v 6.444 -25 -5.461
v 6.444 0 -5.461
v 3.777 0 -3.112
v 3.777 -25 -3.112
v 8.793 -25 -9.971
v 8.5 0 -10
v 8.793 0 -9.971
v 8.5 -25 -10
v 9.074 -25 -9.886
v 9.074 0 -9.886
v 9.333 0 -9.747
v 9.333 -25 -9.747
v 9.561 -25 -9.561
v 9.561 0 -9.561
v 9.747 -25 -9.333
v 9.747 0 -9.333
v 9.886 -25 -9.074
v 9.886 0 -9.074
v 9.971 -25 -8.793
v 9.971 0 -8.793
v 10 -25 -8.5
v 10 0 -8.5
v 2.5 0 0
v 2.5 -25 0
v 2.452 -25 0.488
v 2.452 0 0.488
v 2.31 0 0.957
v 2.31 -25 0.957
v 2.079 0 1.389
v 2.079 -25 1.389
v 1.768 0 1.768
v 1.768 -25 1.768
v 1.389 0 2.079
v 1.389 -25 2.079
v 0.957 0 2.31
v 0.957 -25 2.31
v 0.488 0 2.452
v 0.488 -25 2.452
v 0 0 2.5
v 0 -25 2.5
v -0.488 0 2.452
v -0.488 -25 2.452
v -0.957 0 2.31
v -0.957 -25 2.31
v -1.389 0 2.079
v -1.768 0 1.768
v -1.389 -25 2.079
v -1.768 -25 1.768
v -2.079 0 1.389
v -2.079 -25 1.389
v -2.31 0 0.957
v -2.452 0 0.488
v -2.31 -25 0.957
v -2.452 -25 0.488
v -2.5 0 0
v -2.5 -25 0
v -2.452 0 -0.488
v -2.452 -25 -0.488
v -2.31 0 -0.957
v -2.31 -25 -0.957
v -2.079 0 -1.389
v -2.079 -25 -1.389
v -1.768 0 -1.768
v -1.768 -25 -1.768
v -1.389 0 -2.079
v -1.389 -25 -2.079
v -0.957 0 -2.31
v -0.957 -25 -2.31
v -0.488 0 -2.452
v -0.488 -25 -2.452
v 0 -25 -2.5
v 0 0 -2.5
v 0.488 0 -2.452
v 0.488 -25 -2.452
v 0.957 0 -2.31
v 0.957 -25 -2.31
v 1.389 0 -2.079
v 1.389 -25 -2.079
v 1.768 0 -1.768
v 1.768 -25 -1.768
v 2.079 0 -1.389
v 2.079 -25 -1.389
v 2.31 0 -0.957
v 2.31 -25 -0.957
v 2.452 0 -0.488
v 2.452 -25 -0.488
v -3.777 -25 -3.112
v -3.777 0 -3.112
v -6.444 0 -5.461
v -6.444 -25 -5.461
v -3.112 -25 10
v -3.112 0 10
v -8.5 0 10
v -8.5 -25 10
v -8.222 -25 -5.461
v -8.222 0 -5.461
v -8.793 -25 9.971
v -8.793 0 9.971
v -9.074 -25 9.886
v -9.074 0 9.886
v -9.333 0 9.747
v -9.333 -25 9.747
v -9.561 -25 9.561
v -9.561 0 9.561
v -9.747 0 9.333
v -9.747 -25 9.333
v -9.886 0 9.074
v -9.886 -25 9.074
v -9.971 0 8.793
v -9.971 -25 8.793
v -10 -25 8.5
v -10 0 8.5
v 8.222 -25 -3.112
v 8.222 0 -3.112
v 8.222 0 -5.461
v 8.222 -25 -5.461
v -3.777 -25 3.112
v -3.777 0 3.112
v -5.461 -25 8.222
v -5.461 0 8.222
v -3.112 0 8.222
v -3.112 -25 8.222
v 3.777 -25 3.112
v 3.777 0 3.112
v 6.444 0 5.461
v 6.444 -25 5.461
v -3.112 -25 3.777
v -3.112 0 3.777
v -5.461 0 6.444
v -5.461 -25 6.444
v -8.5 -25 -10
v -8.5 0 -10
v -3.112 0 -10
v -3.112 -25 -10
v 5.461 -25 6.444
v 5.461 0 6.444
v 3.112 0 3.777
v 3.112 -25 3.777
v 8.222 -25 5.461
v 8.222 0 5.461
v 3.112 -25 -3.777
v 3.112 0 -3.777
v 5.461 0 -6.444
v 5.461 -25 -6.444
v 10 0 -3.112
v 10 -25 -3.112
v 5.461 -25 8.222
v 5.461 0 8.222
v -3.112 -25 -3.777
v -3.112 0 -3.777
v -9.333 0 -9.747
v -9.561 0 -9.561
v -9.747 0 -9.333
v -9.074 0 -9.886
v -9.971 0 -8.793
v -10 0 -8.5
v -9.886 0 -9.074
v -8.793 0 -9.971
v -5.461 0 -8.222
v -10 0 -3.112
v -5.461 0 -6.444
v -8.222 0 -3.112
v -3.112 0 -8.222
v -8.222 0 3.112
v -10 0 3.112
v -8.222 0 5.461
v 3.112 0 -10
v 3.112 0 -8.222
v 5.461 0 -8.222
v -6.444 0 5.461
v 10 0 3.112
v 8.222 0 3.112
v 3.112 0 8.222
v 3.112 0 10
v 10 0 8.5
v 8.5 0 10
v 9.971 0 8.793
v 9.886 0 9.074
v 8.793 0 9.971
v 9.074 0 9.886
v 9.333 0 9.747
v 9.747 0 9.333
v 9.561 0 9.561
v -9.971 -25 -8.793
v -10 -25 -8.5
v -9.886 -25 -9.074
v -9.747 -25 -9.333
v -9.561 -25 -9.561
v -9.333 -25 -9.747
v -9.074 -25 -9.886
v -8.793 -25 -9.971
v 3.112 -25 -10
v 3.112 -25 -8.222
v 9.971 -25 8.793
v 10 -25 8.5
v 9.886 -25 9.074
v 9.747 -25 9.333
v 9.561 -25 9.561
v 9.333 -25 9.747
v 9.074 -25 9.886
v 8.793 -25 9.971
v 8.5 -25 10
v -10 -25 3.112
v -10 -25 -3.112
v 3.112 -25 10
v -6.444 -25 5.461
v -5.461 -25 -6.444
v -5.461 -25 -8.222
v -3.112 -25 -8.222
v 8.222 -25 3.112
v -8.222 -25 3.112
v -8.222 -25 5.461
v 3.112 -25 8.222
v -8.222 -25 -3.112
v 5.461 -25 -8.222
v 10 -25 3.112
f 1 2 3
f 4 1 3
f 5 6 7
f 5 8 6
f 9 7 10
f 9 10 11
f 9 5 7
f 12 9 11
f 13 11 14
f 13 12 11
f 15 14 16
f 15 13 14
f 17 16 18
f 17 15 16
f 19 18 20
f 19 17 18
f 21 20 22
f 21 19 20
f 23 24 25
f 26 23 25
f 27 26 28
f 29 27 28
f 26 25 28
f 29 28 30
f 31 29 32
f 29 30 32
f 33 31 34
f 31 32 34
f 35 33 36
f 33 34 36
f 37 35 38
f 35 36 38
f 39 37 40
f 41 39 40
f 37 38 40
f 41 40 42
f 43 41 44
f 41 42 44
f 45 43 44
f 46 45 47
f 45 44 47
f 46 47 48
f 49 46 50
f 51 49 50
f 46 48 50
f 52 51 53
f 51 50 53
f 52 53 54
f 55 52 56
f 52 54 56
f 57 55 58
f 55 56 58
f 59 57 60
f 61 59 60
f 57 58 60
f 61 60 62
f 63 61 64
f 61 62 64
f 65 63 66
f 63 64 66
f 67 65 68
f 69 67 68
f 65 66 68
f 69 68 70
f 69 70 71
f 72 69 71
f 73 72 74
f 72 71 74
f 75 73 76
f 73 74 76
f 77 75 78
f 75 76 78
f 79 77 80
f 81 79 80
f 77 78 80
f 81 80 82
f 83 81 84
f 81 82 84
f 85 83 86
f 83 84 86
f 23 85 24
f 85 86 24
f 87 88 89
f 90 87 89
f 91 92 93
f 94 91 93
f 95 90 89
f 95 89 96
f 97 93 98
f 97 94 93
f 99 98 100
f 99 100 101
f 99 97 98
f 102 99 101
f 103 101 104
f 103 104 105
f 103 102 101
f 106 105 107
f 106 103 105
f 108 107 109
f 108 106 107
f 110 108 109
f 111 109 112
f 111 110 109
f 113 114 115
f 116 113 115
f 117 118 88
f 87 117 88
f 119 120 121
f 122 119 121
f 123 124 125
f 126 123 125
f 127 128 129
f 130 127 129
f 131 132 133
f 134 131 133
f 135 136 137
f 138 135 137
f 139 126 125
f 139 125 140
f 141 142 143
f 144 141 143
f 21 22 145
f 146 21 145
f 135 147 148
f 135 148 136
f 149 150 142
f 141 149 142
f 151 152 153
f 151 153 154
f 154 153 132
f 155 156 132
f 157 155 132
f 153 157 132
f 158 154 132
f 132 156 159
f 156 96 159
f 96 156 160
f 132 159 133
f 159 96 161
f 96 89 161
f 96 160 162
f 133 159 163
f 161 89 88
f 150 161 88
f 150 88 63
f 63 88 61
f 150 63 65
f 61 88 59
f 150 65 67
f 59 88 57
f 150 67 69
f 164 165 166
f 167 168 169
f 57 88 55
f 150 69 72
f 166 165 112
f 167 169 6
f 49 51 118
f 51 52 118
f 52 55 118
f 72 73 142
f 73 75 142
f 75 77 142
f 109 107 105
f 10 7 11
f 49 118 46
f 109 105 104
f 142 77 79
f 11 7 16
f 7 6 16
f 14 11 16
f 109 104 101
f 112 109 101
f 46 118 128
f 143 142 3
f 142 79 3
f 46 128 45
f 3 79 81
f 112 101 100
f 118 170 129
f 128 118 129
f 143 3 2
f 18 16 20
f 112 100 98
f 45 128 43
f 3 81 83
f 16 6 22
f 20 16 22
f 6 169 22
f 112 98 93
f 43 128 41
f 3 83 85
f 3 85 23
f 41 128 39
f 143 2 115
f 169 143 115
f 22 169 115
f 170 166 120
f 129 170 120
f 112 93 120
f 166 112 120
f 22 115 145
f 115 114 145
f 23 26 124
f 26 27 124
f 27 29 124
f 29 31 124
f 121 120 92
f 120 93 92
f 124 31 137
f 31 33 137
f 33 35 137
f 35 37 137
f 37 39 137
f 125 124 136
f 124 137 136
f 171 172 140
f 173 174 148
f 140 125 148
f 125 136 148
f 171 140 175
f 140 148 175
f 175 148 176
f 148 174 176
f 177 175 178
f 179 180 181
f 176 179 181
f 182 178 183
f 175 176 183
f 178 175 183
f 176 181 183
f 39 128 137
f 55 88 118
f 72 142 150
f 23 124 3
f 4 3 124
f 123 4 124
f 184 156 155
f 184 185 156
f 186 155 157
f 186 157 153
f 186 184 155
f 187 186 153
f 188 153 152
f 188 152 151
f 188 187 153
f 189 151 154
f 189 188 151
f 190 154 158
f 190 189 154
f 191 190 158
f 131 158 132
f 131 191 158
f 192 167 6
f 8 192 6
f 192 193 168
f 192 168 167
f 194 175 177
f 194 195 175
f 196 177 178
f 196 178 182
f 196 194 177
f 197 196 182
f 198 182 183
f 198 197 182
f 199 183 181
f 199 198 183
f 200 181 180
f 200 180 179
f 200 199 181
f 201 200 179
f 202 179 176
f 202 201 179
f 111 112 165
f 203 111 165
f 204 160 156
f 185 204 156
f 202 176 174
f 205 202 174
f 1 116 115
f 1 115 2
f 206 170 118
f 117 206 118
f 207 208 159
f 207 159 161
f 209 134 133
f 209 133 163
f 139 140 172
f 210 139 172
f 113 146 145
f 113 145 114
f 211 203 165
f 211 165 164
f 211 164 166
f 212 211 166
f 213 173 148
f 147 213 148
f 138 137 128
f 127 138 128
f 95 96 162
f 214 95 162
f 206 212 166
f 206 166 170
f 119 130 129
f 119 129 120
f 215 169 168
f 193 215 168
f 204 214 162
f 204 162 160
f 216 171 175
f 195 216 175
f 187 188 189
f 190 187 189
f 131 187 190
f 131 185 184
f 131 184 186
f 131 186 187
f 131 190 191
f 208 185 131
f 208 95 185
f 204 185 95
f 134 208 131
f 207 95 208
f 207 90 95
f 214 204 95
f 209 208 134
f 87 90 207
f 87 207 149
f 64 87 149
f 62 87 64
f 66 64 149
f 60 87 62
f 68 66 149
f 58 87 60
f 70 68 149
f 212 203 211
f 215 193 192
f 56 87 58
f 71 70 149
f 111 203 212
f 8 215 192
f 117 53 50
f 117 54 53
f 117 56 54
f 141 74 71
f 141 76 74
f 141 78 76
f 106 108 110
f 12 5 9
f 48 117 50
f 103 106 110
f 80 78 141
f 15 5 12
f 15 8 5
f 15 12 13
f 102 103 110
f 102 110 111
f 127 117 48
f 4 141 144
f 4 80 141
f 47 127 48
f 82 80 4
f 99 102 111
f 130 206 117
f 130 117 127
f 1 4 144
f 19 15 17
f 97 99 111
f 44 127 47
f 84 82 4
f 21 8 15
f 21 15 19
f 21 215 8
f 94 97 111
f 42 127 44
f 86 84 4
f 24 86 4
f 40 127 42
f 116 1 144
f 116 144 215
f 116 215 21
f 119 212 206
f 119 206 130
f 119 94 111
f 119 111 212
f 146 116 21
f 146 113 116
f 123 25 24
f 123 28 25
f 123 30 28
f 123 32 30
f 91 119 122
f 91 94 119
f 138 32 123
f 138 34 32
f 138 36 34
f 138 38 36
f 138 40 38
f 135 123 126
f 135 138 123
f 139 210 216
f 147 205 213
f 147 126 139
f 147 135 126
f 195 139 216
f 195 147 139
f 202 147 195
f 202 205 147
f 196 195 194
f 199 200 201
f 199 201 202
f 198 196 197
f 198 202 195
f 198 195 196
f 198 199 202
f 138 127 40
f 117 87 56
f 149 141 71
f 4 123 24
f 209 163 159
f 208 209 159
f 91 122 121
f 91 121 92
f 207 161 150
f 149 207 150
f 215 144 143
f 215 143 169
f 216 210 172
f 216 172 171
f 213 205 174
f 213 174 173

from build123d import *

# Parameters (mm, degrees)
F1_DEPTH = 25
F2_R     = 1.5
F3_R     = 2.5
F4_DEPTH = 25


with BuildPart() as f1:
    # F0 (on Front) → F1 (new body)
    with BuildSketch(Plane.XZ):
        Polygon((10, 3.1115), (10, 10), (3.1115, 10), (3.1115, 8.222), (5.461, 8.222), (5.461, 6.444), (3.1115, 3.777), (0, 3.777), (-3.1115, 3.777), (-5.461, 6.444), (-5.461, 8.222), (-3.1115, 8.222), (-3.1115, 10), (-10, 10), (-10, 3.1115), (-8.222, 3.1115), (-8.222, 5.461), (-6.444, 5.461), (-3.777, 3.1115), (-3.777, 0), (-3.777, -3.1115), (-6.444, -5.461), (-8.222, -5.461), (-8.222, -3.1115), (-10, -3.1115), (-10, -10), (-3.1115, -10), (-3.1115, -8.222), (-5.461, -8.222), (-5.461, -6.444), (-3.1115, -3.777), (0, -3.777), (3.1115, -3.777), (5.461, -6.444), (5.461, -8.222), (3.1115, -8.222), (3.1115, -10), (10, -10), (10, -3.1115), (8.222, -3.1115), (8.222, -5.461), (6.444, -5.461), (3.777, -3.1115), (3.777, 0), (3.777, 3.1115), (6.444, 5.461), (8.222, 5.461), (8.222, 3.1115), align=None)
    extrude(amount=F1_DEPTH)

    # F2
    f2_edges = [f1.edges().sort_by_distance(p)[0] for p in [
        (-10, -12.5, 10),
        (10, -12.5, 10),
        (10, -12.5, -10),
        (-10, -12.5, -10),
    ]]
    fillet(f2_edges, radius=F2_R)

    # F3 (on face) → F4 (cut, through all)
    with BuildSketch(Plane.XZ.offset(25)):
        Circle(F3_R)
    extrude(amount=-F4_DEPTH, mode=Mode.SUBTRACT)


solid = f1.part
